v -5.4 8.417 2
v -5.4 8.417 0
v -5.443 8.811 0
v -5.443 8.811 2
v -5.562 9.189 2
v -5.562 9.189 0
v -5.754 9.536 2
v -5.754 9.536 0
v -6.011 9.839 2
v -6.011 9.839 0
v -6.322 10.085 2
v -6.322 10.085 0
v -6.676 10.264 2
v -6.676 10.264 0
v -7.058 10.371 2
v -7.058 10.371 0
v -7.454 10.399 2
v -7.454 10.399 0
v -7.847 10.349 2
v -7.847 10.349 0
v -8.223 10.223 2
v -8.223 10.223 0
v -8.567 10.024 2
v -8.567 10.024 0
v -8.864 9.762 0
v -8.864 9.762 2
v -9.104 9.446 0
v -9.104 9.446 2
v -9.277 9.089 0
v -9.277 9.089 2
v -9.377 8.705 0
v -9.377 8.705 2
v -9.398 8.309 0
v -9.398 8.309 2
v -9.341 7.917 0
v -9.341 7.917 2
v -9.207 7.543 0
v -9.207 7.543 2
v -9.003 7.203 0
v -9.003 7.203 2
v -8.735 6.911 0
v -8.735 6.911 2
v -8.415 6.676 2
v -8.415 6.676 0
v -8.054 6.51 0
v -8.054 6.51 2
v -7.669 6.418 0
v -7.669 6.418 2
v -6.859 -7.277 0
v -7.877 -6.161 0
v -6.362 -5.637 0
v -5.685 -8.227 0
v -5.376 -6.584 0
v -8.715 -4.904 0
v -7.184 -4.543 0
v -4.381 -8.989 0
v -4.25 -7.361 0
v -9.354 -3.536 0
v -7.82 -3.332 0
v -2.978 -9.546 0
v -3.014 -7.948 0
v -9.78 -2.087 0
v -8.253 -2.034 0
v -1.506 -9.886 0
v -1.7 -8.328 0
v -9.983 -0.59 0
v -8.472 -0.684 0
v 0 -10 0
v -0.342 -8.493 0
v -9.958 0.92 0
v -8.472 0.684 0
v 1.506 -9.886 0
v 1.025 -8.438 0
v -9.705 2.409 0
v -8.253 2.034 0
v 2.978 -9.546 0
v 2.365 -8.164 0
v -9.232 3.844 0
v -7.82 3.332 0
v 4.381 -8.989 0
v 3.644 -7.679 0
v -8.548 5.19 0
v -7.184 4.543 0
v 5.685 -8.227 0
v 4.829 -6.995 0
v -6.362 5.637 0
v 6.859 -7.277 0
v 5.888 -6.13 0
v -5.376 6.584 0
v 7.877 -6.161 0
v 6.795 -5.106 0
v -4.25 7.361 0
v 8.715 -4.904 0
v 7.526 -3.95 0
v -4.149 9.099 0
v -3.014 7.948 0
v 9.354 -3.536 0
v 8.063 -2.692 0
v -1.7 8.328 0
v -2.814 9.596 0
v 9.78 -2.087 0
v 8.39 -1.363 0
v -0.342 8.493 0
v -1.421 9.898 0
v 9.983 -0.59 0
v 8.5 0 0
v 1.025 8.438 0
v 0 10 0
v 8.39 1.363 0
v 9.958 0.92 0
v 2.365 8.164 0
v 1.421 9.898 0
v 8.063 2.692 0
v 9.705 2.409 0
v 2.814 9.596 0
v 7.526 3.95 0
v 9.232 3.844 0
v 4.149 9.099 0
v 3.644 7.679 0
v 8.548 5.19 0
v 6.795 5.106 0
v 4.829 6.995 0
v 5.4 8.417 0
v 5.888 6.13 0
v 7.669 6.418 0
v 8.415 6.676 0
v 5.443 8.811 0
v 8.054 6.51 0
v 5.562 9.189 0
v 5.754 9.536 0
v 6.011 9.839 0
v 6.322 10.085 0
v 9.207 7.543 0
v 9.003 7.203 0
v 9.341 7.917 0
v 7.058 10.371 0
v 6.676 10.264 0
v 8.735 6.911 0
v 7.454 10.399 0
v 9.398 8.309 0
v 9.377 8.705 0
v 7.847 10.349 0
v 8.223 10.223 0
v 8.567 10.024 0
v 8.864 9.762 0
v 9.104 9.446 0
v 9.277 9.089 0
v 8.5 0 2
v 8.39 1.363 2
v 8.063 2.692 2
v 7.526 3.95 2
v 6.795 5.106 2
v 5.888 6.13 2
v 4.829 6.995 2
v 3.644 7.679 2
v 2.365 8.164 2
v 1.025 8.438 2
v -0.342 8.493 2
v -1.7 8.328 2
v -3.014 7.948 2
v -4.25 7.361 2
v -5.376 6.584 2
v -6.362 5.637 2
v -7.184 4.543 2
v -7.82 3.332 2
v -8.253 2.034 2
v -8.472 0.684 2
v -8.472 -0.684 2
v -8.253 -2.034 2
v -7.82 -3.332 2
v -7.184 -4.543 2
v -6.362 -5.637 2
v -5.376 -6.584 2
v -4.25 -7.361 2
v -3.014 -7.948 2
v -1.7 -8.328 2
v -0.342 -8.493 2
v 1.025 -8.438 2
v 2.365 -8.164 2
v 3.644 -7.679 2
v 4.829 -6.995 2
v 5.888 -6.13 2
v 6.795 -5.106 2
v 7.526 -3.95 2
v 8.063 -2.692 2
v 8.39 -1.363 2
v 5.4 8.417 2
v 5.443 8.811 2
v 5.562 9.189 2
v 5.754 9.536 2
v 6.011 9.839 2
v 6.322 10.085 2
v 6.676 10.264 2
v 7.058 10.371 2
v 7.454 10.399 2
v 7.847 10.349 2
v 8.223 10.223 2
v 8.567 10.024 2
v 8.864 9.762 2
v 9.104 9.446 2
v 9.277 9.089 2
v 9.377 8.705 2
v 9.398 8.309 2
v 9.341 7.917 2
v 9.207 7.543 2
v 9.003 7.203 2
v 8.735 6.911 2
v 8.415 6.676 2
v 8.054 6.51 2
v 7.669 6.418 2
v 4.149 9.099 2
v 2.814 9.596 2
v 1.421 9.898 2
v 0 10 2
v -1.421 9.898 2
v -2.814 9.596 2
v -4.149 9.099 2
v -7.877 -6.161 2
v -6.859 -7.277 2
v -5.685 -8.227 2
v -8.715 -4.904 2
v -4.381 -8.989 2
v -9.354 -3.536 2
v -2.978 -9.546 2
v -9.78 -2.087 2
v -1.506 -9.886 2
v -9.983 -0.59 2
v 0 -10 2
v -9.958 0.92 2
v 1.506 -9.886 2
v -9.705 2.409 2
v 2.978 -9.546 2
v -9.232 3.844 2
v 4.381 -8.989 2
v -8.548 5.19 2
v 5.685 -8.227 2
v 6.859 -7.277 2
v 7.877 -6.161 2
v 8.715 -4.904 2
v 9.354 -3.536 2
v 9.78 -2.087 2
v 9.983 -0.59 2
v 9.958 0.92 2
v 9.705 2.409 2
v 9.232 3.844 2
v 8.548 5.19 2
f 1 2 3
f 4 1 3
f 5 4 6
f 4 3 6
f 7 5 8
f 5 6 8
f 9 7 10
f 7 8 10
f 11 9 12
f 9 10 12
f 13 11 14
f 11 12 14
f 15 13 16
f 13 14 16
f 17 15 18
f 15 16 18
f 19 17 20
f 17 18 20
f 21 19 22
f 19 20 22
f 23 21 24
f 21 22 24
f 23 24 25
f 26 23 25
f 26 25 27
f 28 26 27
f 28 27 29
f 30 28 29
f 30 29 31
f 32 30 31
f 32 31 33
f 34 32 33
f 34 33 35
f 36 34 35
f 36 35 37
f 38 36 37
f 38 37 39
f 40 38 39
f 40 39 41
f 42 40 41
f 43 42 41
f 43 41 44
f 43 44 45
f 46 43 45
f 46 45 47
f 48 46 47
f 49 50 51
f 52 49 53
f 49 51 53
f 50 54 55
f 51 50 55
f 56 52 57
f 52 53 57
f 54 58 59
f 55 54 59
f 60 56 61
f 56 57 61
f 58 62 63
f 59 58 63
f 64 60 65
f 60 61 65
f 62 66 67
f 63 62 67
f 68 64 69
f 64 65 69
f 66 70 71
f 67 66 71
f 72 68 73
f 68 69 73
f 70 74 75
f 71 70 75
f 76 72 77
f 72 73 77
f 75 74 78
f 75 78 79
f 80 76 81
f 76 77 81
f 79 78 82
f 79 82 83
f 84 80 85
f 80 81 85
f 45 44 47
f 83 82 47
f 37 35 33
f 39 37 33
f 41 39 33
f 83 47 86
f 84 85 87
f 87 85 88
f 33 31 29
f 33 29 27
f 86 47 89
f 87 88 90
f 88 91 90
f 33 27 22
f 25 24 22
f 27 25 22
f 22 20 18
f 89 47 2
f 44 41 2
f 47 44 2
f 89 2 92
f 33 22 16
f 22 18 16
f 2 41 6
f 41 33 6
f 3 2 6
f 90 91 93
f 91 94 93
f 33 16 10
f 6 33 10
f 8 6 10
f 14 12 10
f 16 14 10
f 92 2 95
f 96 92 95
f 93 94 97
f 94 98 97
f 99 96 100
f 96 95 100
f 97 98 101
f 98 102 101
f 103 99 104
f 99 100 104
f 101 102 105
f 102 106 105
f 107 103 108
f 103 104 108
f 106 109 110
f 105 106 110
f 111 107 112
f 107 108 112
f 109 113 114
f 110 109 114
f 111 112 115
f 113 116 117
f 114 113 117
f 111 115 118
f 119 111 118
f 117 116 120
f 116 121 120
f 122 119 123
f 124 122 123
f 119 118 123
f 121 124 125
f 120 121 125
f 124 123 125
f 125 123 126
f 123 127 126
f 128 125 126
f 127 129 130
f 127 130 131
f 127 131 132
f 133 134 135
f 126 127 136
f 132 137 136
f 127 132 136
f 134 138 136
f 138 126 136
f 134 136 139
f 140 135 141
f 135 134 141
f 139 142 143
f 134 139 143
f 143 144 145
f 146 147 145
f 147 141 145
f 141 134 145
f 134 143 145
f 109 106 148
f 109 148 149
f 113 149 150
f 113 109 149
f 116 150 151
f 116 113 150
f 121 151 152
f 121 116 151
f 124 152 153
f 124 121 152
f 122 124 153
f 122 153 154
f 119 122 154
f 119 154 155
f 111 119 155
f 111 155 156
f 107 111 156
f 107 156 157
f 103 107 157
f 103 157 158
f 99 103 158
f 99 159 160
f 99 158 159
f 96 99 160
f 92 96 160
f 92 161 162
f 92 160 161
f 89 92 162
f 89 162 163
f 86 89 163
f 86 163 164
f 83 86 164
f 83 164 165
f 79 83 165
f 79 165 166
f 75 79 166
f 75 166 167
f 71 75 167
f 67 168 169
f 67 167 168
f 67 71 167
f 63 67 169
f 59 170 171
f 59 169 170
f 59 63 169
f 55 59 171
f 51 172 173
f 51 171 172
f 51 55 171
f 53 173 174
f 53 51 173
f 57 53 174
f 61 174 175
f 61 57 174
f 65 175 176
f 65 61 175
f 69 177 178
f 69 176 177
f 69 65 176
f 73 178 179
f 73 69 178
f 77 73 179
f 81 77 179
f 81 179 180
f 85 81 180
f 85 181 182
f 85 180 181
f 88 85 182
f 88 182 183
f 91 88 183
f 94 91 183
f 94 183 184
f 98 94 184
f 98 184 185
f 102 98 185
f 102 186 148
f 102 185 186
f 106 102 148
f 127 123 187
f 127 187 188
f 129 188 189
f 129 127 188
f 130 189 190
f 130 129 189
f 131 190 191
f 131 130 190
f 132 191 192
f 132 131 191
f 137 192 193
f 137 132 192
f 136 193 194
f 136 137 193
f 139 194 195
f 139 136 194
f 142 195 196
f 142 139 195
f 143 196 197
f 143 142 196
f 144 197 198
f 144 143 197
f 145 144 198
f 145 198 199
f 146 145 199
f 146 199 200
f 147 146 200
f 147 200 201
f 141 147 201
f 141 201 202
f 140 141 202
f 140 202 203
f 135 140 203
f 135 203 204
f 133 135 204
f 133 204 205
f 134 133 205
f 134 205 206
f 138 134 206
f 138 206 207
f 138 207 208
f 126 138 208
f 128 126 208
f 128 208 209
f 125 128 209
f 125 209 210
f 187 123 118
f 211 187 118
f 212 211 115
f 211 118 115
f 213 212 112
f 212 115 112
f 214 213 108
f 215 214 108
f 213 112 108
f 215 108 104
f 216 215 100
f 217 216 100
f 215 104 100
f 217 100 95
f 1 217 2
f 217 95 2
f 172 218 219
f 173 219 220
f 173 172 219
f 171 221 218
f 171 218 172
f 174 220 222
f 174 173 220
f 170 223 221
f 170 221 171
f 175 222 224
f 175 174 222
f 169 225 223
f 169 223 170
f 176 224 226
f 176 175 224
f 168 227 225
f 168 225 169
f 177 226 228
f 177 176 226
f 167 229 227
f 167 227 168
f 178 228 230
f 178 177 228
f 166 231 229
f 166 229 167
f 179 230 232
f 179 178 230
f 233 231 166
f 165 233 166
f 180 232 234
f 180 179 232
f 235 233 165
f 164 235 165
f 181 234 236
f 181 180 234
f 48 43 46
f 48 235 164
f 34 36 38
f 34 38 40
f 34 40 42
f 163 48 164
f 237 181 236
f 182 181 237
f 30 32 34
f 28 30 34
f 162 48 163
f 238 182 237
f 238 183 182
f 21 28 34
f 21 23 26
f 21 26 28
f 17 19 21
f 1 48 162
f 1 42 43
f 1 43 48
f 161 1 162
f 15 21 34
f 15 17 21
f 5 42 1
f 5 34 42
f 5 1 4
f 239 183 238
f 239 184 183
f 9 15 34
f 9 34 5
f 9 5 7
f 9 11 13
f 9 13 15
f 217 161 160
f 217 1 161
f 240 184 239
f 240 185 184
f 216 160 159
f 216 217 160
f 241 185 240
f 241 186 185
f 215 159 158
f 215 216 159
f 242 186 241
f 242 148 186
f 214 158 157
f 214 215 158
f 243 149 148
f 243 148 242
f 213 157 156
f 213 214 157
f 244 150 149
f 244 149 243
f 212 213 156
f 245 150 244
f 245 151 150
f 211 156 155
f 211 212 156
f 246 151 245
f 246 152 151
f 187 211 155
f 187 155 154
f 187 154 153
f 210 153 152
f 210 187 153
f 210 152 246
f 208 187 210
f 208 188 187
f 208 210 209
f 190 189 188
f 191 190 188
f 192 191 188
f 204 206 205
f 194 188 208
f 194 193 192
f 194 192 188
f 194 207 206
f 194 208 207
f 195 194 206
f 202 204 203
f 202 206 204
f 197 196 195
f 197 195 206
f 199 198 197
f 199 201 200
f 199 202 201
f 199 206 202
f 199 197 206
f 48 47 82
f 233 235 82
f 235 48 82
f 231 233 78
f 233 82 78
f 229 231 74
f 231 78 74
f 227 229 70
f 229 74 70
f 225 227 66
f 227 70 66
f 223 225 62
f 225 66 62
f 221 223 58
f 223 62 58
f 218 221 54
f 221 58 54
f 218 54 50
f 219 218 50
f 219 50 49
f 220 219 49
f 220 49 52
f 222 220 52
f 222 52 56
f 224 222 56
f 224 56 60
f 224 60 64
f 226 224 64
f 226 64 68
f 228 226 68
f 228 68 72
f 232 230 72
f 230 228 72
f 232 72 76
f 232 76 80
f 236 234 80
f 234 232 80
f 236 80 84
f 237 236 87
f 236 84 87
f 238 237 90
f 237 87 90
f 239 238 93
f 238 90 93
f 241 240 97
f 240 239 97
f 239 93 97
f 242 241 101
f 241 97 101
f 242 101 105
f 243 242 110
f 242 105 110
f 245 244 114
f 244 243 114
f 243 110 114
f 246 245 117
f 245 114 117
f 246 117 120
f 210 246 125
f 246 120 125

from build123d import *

# Parameters (mm, degrees)
CYLINDER001_R     = 8.5
CYLINDER001_DEPTH = 10
CYLINDER_R        = 10
CYLINDER_DEPTH    = 2
CYLINDER002_R     = 2
CYLINDER002_DEPTH = 2


with BuildPart() as cilindro001:
    # Cylinder001 → Cylinder001 (new body)
    with BuildSketch(Plane.XY.offset(-4)):
        Circle(CYLINDER001_R)
    extrude(amount=CYLINDER001_DEPTH)


with BuildPart() as cut:
    # Cylinder → Cylinder (new body)
    with BuildSketch(Plane.XY):
        Circle(CYLINDER_R)
    extrude(amount=CYLINDER_DEPTH)

    # Cut: cut Cilindro001
    add(cilindro001.part, mode=Mode.SUBTRACT)


with BuildPart() as oreja_izquierda:
    # Cylinder002 → Cylinder002 (new body)
    with BuildSketch(Plane(origin=(-7.4, 8.4, 0), x_dir=(1, 0, 0), z_dir=(0, 0, 1))):
        Circle(CYLINDER002_R)
    extrude(amount=CYLINDER002_DEPTH)


with BuildPart() as part_mirroring:
    # Part__Mirroring: instance of Oreja-izquierda
    add(oreja_izquierda.part.mirror(Plane(origin=(0, 0, 0), x_dir=(0, -1, 0), z_dir=(1, 0, 0))))


with BuildPart() as anillo_osito:
    # Fusion base: copy of Oreja-izquierda
    add(oreja_izquierda.part)

    # Fusion: union Part__Mirroring
    add(part_mirroring.part)

    # Fusion001: union Cut
    add(cut.part)


solid = anillo_osito.part
